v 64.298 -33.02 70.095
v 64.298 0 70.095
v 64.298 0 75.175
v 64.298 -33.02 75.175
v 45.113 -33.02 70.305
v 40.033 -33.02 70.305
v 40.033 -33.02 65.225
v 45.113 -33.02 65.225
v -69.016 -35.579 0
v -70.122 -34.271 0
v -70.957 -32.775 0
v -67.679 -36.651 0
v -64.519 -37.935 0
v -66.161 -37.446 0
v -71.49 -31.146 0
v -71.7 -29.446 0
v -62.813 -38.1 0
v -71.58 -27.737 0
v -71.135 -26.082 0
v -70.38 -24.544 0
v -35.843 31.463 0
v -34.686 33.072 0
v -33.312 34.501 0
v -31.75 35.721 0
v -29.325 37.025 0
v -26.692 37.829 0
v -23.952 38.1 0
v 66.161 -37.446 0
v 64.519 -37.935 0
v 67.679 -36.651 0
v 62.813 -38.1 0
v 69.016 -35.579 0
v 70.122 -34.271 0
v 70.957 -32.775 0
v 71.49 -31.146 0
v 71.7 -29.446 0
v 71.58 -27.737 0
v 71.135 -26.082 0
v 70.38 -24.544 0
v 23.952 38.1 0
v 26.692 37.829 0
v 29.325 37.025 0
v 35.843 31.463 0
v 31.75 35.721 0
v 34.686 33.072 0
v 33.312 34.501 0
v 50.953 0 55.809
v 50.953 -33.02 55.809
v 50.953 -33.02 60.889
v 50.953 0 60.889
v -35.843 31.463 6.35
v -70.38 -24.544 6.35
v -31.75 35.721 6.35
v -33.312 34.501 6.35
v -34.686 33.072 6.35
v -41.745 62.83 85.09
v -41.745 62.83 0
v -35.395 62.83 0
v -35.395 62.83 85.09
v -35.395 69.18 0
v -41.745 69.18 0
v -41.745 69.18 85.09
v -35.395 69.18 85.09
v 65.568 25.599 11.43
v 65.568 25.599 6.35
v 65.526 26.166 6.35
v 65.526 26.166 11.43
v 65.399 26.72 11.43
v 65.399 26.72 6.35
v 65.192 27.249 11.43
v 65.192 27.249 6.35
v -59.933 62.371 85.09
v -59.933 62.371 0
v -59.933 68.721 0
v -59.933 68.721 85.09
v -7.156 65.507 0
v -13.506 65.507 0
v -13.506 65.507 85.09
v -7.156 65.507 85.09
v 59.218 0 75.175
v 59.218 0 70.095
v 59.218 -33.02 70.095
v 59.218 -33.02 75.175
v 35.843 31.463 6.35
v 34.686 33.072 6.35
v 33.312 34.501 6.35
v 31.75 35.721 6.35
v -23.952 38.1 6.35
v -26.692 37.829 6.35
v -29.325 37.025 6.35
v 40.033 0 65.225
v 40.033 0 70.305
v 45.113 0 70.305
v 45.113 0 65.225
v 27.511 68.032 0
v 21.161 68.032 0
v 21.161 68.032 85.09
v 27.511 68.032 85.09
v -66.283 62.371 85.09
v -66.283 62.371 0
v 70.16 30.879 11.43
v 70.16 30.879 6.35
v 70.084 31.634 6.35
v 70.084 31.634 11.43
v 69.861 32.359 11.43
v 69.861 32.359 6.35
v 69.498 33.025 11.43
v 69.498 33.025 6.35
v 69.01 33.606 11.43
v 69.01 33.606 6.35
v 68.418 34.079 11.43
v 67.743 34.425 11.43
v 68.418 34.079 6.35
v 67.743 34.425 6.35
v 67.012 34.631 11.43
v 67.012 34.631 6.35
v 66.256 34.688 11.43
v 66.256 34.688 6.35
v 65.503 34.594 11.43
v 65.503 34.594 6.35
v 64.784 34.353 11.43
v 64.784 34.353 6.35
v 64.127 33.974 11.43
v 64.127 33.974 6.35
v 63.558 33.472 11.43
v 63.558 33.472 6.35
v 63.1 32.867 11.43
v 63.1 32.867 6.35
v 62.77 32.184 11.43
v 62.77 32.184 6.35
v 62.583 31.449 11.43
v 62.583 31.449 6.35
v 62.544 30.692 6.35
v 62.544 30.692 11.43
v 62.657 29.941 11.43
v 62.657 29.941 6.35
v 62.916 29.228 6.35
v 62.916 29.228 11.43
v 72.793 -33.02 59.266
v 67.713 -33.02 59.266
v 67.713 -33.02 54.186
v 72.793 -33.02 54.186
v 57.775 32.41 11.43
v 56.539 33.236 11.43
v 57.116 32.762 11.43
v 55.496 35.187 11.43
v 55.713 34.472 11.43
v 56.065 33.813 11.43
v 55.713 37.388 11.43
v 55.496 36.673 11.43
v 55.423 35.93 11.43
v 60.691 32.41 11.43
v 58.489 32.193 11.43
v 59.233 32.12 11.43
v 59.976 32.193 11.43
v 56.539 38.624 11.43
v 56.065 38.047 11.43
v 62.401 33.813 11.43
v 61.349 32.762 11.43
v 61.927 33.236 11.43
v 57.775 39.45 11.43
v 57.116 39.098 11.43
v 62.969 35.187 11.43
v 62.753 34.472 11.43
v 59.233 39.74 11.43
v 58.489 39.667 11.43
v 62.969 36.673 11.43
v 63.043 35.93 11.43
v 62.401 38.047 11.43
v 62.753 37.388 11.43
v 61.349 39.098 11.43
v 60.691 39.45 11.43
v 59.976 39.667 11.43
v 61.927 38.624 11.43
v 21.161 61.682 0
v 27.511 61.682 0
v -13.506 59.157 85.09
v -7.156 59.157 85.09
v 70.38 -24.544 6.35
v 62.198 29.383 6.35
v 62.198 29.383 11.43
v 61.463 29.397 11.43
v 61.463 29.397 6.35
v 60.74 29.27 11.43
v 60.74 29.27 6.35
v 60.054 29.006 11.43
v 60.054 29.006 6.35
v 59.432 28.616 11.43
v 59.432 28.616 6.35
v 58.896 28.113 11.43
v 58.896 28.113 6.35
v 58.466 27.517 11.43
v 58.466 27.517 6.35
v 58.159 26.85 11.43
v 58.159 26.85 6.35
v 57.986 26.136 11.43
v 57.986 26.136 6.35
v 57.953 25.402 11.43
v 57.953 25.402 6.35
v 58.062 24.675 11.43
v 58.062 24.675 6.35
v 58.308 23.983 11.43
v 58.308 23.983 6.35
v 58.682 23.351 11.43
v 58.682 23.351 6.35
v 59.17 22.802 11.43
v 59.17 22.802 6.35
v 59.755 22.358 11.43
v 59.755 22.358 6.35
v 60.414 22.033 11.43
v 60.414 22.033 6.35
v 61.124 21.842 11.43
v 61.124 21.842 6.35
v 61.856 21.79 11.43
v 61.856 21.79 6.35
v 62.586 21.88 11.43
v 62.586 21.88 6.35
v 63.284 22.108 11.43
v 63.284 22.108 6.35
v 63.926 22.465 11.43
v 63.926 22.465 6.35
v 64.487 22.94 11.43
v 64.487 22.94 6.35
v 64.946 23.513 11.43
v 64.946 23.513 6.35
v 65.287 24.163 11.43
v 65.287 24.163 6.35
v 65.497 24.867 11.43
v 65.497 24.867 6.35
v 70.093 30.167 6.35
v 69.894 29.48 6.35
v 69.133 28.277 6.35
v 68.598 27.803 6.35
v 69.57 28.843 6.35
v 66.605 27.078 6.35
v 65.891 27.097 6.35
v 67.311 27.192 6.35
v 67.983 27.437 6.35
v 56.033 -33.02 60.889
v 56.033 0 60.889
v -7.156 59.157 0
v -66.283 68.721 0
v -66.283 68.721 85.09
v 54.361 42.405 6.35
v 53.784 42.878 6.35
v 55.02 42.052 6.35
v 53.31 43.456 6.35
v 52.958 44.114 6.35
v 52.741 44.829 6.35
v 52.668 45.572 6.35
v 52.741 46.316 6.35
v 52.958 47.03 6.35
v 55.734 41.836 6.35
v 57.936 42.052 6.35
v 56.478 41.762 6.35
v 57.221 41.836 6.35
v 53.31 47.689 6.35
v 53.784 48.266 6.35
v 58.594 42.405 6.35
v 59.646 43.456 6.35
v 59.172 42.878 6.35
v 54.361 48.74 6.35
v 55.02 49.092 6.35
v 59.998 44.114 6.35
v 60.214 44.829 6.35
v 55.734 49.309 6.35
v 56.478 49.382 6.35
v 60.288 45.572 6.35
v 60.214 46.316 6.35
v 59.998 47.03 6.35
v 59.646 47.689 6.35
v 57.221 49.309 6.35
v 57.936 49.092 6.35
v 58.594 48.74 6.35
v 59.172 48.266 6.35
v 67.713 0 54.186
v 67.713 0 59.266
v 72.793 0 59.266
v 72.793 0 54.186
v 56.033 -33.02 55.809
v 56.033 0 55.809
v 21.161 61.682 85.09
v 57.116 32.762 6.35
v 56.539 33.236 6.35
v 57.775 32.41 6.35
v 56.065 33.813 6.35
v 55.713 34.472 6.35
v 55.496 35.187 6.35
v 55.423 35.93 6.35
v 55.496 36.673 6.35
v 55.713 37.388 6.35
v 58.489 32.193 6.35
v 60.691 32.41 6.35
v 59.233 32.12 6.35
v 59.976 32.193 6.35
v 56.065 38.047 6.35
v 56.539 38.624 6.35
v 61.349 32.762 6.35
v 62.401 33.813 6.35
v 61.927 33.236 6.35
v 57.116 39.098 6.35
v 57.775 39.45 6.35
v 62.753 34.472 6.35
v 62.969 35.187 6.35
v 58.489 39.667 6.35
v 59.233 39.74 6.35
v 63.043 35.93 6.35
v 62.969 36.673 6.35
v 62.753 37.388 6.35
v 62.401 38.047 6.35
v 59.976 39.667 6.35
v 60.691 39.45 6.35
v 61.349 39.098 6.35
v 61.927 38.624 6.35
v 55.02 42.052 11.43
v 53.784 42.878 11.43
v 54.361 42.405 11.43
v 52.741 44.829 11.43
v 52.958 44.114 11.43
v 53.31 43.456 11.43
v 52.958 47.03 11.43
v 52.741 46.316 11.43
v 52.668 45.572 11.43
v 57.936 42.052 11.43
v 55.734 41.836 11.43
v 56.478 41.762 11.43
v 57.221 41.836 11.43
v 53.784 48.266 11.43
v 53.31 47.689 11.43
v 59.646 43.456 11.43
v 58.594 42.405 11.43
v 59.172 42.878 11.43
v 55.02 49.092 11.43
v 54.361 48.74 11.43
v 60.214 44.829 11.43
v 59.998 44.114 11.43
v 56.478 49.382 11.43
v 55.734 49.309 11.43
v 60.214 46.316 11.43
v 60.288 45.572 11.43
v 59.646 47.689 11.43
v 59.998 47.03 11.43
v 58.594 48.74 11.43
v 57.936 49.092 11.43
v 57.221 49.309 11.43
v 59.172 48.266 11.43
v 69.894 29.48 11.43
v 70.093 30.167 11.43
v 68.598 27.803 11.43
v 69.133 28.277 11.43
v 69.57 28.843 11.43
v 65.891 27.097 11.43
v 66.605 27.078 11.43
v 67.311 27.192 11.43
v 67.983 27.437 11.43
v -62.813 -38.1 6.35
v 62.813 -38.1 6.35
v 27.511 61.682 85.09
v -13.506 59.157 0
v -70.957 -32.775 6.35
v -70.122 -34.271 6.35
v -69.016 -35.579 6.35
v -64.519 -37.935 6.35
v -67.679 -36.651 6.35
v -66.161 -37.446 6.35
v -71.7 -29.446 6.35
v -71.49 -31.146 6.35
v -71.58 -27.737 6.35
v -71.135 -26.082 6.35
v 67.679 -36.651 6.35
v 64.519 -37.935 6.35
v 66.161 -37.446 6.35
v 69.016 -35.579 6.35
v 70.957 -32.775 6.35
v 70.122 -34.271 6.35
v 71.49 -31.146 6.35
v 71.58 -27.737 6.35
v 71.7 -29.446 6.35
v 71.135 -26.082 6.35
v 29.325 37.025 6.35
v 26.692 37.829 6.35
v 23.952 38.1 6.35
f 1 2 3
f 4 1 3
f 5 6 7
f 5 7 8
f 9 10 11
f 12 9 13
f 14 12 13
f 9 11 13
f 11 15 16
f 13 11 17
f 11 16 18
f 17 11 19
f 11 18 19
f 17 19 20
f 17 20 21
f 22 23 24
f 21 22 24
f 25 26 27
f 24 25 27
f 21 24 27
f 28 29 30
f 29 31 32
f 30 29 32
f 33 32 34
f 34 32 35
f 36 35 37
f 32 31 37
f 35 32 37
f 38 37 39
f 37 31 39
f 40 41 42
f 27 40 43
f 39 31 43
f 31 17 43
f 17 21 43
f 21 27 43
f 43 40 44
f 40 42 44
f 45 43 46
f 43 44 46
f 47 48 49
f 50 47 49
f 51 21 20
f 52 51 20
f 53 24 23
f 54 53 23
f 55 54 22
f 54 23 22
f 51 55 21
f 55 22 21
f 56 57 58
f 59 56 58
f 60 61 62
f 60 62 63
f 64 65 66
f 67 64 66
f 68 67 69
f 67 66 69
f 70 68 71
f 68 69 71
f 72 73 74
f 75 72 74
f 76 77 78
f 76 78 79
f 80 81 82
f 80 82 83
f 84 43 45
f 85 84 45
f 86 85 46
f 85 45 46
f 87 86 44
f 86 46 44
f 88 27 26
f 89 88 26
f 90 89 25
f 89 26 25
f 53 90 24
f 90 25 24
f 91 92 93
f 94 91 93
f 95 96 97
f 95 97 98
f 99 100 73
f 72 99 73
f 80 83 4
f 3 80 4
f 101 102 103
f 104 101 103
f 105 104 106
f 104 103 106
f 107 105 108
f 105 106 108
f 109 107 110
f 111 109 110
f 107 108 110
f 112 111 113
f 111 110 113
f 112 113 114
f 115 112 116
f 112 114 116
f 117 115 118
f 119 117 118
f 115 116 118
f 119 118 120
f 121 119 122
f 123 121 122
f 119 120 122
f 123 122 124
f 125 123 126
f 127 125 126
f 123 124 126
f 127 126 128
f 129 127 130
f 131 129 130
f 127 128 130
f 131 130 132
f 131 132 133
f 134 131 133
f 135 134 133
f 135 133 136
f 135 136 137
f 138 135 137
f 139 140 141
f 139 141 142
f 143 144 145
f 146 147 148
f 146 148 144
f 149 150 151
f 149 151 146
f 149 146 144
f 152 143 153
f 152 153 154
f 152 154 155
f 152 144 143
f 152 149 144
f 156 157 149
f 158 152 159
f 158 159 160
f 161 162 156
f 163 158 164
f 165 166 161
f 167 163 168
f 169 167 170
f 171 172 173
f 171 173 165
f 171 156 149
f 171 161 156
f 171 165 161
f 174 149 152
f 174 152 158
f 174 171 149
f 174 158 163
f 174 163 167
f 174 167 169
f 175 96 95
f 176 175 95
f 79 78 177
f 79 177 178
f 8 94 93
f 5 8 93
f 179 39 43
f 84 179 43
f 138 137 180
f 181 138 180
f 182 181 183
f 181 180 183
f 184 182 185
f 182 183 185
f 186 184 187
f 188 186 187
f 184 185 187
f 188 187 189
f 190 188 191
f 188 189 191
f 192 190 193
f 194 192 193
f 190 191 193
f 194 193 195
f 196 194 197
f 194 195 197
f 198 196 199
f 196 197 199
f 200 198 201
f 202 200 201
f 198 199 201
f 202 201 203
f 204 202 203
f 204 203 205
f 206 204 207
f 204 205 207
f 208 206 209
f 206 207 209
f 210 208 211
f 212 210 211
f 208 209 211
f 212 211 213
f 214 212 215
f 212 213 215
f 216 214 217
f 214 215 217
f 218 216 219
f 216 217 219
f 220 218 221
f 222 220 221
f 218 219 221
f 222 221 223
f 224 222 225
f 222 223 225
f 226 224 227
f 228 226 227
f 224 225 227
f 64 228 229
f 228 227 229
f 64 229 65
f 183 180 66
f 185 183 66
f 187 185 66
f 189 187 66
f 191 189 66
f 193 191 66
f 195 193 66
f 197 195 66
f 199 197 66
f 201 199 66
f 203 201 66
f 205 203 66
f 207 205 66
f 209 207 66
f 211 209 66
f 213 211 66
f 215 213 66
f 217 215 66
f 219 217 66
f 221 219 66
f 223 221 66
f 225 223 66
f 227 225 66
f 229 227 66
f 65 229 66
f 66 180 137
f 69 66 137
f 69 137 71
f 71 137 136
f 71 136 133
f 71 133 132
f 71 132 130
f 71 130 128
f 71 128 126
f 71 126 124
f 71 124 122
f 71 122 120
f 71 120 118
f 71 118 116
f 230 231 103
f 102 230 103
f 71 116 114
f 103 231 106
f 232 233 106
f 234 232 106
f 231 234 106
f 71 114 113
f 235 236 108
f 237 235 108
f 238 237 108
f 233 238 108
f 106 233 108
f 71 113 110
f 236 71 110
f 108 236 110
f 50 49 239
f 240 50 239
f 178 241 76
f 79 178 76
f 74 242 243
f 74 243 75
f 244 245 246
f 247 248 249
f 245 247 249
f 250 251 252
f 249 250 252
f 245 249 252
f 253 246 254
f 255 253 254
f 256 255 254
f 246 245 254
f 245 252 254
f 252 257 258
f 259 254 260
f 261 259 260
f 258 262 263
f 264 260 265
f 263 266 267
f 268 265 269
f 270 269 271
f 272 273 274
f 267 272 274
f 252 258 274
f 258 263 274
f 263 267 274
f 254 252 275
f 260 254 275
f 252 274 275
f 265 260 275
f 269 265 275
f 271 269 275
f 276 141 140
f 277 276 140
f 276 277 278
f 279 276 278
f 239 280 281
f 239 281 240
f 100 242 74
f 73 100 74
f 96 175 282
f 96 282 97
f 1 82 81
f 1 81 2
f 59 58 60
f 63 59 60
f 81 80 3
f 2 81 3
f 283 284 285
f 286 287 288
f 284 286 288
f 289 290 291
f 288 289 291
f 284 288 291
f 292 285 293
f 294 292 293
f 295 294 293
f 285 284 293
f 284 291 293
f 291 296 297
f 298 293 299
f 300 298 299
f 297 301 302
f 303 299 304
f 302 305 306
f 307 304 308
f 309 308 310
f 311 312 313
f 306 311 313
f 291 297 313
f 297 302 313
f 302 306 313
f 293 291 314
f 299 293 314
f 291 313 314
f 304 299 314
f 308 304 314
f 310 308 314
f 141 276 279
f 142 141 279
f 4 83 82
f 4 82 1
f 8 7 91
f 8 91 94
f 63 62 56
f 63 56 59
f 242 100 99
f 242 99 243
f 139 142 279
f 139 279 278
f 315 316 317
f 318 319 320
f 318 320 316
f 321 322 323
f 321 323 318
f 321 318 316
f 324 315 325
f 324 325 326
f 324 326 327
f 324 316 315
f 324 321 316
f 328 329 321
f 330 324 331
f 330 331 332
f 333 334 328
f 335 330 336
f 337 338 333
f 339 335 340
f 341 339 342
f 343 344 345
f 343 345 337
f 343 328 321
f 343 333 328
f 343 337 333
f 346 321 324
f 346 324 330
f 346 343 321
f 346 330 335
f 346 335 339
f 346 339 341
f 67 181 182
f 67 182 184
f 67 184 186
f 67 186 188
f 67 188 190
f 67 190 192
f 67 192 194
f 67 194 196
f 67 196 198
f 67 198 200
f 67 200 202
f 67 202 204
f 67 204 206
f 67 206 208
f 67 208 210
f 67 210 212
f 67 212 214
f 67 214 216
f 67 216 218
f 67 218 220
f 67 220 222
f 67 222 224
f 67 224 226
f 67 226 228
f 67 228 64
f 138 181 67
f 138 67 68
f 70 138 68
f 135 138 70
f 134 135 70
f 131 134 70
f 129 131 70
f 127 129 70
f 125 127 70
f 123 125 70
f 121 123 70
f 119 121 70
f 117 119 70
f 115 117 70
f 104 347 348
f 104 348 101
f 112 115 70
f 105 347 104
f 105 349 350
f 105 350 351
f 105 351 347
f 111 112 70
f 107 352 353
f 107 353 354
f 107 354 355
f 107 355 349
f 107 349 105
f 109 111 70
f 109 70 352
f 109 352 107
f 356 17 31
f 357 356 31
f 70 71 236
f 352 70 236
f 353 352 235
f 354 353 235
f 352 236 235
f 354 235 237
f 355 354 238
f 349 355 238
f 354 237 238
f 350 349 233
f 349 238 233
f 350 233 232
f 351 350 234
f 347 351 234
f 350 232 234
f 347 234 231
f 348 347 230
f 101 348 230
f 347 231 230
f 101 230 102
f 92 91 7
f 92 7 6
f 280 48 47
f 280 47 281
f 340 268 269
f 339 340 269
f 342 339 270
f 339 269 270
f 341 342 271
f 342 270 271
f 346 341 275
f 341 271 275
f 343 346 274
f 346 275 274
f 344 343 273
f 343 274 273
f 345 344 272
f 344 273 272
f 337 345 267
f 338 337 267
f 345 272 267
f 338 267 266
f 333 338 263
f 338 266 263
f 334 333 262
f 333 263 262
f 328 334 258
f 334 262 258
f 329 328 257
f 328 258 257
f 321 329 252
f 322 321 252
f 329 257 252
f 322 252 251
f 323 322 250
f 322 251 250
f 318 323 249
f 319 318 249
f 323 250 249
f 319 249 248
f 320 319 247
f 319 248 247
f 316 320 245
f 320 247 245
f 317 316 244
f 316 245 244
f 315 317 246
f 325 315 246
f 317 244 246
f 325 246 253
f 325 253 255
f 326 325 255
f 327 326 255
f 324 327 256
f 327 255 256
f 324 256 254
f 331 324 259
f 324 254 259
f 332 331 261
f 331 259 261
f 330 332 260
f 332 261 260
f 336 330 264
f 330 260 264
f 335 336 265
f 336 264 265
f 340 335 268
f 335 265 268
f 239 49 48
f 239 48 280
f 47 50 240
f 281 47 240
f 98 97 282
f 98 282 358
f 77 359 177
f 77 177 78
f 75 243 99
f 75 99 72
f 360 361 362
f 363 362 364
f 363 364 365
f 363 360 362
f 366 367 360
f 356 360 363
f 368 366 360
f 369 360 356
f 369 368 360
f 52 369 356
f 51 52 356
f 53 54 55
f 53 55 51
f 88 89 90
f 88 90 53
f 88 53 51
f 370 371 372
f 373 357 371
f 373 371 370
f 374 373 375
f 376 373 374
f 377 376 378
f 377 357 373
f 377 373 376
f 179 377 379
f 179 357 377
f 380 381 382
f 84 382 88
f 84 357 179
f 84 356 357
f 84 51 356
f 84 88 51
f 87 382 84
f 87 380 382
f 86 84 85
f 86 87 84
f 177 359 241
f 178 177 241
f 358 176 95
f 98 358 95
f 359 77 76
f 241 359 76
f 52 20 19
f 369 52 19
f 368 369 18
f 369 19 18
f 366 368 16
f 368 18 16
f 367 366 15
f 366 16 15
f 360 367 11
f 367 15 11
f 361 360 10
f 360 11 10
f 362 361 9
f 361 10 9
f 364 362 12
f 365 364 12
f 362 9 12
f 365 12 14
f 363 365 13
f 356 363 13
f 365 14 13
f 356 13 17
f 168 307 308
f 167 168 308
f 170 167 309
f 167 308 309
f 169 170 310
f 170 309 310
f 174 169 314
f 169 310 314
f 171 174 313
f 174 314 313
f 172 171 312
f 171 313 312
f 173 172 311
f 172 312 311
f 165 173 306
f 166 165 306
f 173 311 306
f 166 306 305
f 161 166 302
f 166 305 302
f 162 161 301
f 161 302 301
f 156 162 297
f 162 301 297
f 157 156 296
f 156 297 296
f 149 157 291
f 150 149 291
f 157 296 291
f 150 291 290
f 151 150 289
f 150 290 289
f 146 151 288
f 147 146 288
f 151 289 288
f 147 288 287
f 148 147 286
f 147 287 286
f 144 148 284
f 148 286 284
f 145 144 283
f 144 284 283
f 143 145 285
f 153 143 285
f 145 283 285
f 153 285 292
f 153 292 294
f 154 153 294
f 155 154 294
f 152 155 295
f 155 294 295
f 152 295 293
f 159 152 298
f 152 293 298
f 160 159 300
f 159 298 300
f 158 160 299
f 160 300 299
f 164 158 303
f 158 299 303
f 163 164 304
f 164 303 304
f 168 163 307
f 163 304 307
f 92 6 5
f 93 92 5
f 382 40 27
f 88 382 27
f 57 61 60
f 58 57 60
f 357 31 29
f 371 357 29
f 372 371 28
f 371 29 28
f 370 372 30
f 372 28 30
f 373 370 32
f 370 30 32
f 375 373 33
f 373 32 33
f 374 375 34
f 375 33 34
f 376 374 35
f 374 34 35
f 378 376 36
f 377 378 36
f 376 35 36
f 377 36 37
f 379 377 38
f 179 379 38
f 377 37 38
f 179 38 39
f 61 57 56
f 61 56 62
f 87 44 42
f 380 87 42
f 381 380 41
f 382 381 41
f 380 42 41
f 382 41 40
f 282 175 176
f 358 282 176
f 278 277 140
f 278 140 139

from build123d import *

# Parameters (mm, degrees)
F1_DEPTH = 6.35
F2_W     = 6.35
F2_H     = 6.35
F3_DEPTH = 85.09
F5_R     = 3.81
F6_DEPTH = 5.08
F4_W     = 5.08
F4_H     = 5.08
F7_DEPTH = 33.02


with BuildPart() as f1:
    # F0 (on Top) → F1 (new body)
    with BuildSketch(Plane.XY):
        with BuildLine():
            Line((23.952148, 38.1), (-23.952148, 38.1))
            ThreePointArc((-23.952148, 38.1), (-28.028467, 37.492055), (-31.75, 35.721134))
            Line((-31.75, 35.721134), (-31.75, -38.1))
            Line((-31.75, -38.1), (31.75, -38.1))
            Line((31.75, -38.1), (31.75, 35.721134))
            ThreePointArc((31.75, 35.721134), (28.028467, 37.492055), (23.952148, 38.1))
        make_face()
        with BuildLine():
            Line((-31.75, -38.1), (-31.75, 35.721134))
            ThreePointArc((-31.75, 35.721134), (-34.024133, 33.810703), (-35.843005, 31.462695))
            Line((-35.843005, 31.462695), (-70.380306, -24.543739))
            ThreePointArc((-70.380306, -24.543739), (-70.575972, -33.542958), (-62.813397, -38.1))
            Line((-62.813397, -38.1), (-31.75, -38.1))
        make_face()
        with BuildLine():
            ThreePointArc((35.843005, 31.462695), (34.024133, 33.810703), (31.75, 35.721134))
            Line((31.75, 35.721134), (31.75, -38.1))
            Line((31.75, -38.1), (62.813397, -38.1))
            ThreePointArc((62.813397, -38.1), (70.575972, -33.542958), (70.380306, -24.543739))
            Line((70.380306, -24.543739), (35.843005, 31.462695))
        make_face()
    extrude(amount=F1_DEPTH)


with BuildPart() as f3:
    # F2 (on Top) → F3 (new body)
    with BuildSketch(Plane.XY):
        with Locations((-10.331276, 62.332038)):
            Rectangle(F2_W, F2_H)
        with Locations((24.335895, 64.857461)):
            Rectangle(F2_W, F2_H)
        with Locations((-63.108242, 65.546215)):
            Rectangle(F2_W, F2_H)
        with Locations((-38.570102, 66.005379)):
            Rectangle(F2_W, F2_H)
    extrude(amount=F3_DEPTH)


with BuildPart() as f6:
    # F5 (on face) → F6 (new body)
    with BuildSketch(Plane.XY.offset(6.35)):
        with Locations((56.477647, 45.572411)):
            Circle(F5_R)
        with Locations((59.232652, 35.929885)):
            Circle(F5_R)
        with BuildLine():
            ThreePointArc((65.191969, 27.249216), (68.597527, 27.802736), (70.15976, 30.879039))
            ThreePointArc((70.15976, 30.879039), (65.503303, 34.593822), (62.91587, 29.228433))
            ThreePointArc((62.91587, 29.228433), (64.258121, 28.473656), (65.191969, 27.249216))
        make_face()
        with BuildLine():
            ThreePointArc((65.191969, 27.249216), (63.849718, 28.003993), (62.91587, 29.228433))
            ThreePointArc((62.91587, 29.228433), (58.681775, 23.350842), (65.568079, 25.59861))
            ThreePointArc((65.568079, 25.59861), (65.472861, 26.445067), (65.191969, 27.249216))
        make_face()
        with BuildLine():
            ThreePointArc((65.191969, 27.249216), (64.258121, 28.473656), (62.91587, 29.228433))
            ThreePointArc((62.91587, 29.228433), (63.849718, 28.003993), (65.191969, 27.249216))
        make_face()
    extrude(amount=F6_DEPTH)


with BuildPart() as f7:
    # F4 (on Front) → F7 (new body)
    with BuildSketch(Plane.XZ):
        with Locations((42.572917, 67.765154)):
            Rectangle(F4_W, F4_H)
        with Locations((53.493056, 58.349408)):
            Rectangle(F4_W, F4_H)
        with Locations((70.252679, 56.726009)):
            Rectangle(F4_W, F4_H)
        with Locations((61.758079, 72.63536)):
            Rectangle(F4_W, F4_H)
    extrude(amount=F7_DEPTH)


solid = Compound([f1.part, f3.part, f6.part, f7.part])
